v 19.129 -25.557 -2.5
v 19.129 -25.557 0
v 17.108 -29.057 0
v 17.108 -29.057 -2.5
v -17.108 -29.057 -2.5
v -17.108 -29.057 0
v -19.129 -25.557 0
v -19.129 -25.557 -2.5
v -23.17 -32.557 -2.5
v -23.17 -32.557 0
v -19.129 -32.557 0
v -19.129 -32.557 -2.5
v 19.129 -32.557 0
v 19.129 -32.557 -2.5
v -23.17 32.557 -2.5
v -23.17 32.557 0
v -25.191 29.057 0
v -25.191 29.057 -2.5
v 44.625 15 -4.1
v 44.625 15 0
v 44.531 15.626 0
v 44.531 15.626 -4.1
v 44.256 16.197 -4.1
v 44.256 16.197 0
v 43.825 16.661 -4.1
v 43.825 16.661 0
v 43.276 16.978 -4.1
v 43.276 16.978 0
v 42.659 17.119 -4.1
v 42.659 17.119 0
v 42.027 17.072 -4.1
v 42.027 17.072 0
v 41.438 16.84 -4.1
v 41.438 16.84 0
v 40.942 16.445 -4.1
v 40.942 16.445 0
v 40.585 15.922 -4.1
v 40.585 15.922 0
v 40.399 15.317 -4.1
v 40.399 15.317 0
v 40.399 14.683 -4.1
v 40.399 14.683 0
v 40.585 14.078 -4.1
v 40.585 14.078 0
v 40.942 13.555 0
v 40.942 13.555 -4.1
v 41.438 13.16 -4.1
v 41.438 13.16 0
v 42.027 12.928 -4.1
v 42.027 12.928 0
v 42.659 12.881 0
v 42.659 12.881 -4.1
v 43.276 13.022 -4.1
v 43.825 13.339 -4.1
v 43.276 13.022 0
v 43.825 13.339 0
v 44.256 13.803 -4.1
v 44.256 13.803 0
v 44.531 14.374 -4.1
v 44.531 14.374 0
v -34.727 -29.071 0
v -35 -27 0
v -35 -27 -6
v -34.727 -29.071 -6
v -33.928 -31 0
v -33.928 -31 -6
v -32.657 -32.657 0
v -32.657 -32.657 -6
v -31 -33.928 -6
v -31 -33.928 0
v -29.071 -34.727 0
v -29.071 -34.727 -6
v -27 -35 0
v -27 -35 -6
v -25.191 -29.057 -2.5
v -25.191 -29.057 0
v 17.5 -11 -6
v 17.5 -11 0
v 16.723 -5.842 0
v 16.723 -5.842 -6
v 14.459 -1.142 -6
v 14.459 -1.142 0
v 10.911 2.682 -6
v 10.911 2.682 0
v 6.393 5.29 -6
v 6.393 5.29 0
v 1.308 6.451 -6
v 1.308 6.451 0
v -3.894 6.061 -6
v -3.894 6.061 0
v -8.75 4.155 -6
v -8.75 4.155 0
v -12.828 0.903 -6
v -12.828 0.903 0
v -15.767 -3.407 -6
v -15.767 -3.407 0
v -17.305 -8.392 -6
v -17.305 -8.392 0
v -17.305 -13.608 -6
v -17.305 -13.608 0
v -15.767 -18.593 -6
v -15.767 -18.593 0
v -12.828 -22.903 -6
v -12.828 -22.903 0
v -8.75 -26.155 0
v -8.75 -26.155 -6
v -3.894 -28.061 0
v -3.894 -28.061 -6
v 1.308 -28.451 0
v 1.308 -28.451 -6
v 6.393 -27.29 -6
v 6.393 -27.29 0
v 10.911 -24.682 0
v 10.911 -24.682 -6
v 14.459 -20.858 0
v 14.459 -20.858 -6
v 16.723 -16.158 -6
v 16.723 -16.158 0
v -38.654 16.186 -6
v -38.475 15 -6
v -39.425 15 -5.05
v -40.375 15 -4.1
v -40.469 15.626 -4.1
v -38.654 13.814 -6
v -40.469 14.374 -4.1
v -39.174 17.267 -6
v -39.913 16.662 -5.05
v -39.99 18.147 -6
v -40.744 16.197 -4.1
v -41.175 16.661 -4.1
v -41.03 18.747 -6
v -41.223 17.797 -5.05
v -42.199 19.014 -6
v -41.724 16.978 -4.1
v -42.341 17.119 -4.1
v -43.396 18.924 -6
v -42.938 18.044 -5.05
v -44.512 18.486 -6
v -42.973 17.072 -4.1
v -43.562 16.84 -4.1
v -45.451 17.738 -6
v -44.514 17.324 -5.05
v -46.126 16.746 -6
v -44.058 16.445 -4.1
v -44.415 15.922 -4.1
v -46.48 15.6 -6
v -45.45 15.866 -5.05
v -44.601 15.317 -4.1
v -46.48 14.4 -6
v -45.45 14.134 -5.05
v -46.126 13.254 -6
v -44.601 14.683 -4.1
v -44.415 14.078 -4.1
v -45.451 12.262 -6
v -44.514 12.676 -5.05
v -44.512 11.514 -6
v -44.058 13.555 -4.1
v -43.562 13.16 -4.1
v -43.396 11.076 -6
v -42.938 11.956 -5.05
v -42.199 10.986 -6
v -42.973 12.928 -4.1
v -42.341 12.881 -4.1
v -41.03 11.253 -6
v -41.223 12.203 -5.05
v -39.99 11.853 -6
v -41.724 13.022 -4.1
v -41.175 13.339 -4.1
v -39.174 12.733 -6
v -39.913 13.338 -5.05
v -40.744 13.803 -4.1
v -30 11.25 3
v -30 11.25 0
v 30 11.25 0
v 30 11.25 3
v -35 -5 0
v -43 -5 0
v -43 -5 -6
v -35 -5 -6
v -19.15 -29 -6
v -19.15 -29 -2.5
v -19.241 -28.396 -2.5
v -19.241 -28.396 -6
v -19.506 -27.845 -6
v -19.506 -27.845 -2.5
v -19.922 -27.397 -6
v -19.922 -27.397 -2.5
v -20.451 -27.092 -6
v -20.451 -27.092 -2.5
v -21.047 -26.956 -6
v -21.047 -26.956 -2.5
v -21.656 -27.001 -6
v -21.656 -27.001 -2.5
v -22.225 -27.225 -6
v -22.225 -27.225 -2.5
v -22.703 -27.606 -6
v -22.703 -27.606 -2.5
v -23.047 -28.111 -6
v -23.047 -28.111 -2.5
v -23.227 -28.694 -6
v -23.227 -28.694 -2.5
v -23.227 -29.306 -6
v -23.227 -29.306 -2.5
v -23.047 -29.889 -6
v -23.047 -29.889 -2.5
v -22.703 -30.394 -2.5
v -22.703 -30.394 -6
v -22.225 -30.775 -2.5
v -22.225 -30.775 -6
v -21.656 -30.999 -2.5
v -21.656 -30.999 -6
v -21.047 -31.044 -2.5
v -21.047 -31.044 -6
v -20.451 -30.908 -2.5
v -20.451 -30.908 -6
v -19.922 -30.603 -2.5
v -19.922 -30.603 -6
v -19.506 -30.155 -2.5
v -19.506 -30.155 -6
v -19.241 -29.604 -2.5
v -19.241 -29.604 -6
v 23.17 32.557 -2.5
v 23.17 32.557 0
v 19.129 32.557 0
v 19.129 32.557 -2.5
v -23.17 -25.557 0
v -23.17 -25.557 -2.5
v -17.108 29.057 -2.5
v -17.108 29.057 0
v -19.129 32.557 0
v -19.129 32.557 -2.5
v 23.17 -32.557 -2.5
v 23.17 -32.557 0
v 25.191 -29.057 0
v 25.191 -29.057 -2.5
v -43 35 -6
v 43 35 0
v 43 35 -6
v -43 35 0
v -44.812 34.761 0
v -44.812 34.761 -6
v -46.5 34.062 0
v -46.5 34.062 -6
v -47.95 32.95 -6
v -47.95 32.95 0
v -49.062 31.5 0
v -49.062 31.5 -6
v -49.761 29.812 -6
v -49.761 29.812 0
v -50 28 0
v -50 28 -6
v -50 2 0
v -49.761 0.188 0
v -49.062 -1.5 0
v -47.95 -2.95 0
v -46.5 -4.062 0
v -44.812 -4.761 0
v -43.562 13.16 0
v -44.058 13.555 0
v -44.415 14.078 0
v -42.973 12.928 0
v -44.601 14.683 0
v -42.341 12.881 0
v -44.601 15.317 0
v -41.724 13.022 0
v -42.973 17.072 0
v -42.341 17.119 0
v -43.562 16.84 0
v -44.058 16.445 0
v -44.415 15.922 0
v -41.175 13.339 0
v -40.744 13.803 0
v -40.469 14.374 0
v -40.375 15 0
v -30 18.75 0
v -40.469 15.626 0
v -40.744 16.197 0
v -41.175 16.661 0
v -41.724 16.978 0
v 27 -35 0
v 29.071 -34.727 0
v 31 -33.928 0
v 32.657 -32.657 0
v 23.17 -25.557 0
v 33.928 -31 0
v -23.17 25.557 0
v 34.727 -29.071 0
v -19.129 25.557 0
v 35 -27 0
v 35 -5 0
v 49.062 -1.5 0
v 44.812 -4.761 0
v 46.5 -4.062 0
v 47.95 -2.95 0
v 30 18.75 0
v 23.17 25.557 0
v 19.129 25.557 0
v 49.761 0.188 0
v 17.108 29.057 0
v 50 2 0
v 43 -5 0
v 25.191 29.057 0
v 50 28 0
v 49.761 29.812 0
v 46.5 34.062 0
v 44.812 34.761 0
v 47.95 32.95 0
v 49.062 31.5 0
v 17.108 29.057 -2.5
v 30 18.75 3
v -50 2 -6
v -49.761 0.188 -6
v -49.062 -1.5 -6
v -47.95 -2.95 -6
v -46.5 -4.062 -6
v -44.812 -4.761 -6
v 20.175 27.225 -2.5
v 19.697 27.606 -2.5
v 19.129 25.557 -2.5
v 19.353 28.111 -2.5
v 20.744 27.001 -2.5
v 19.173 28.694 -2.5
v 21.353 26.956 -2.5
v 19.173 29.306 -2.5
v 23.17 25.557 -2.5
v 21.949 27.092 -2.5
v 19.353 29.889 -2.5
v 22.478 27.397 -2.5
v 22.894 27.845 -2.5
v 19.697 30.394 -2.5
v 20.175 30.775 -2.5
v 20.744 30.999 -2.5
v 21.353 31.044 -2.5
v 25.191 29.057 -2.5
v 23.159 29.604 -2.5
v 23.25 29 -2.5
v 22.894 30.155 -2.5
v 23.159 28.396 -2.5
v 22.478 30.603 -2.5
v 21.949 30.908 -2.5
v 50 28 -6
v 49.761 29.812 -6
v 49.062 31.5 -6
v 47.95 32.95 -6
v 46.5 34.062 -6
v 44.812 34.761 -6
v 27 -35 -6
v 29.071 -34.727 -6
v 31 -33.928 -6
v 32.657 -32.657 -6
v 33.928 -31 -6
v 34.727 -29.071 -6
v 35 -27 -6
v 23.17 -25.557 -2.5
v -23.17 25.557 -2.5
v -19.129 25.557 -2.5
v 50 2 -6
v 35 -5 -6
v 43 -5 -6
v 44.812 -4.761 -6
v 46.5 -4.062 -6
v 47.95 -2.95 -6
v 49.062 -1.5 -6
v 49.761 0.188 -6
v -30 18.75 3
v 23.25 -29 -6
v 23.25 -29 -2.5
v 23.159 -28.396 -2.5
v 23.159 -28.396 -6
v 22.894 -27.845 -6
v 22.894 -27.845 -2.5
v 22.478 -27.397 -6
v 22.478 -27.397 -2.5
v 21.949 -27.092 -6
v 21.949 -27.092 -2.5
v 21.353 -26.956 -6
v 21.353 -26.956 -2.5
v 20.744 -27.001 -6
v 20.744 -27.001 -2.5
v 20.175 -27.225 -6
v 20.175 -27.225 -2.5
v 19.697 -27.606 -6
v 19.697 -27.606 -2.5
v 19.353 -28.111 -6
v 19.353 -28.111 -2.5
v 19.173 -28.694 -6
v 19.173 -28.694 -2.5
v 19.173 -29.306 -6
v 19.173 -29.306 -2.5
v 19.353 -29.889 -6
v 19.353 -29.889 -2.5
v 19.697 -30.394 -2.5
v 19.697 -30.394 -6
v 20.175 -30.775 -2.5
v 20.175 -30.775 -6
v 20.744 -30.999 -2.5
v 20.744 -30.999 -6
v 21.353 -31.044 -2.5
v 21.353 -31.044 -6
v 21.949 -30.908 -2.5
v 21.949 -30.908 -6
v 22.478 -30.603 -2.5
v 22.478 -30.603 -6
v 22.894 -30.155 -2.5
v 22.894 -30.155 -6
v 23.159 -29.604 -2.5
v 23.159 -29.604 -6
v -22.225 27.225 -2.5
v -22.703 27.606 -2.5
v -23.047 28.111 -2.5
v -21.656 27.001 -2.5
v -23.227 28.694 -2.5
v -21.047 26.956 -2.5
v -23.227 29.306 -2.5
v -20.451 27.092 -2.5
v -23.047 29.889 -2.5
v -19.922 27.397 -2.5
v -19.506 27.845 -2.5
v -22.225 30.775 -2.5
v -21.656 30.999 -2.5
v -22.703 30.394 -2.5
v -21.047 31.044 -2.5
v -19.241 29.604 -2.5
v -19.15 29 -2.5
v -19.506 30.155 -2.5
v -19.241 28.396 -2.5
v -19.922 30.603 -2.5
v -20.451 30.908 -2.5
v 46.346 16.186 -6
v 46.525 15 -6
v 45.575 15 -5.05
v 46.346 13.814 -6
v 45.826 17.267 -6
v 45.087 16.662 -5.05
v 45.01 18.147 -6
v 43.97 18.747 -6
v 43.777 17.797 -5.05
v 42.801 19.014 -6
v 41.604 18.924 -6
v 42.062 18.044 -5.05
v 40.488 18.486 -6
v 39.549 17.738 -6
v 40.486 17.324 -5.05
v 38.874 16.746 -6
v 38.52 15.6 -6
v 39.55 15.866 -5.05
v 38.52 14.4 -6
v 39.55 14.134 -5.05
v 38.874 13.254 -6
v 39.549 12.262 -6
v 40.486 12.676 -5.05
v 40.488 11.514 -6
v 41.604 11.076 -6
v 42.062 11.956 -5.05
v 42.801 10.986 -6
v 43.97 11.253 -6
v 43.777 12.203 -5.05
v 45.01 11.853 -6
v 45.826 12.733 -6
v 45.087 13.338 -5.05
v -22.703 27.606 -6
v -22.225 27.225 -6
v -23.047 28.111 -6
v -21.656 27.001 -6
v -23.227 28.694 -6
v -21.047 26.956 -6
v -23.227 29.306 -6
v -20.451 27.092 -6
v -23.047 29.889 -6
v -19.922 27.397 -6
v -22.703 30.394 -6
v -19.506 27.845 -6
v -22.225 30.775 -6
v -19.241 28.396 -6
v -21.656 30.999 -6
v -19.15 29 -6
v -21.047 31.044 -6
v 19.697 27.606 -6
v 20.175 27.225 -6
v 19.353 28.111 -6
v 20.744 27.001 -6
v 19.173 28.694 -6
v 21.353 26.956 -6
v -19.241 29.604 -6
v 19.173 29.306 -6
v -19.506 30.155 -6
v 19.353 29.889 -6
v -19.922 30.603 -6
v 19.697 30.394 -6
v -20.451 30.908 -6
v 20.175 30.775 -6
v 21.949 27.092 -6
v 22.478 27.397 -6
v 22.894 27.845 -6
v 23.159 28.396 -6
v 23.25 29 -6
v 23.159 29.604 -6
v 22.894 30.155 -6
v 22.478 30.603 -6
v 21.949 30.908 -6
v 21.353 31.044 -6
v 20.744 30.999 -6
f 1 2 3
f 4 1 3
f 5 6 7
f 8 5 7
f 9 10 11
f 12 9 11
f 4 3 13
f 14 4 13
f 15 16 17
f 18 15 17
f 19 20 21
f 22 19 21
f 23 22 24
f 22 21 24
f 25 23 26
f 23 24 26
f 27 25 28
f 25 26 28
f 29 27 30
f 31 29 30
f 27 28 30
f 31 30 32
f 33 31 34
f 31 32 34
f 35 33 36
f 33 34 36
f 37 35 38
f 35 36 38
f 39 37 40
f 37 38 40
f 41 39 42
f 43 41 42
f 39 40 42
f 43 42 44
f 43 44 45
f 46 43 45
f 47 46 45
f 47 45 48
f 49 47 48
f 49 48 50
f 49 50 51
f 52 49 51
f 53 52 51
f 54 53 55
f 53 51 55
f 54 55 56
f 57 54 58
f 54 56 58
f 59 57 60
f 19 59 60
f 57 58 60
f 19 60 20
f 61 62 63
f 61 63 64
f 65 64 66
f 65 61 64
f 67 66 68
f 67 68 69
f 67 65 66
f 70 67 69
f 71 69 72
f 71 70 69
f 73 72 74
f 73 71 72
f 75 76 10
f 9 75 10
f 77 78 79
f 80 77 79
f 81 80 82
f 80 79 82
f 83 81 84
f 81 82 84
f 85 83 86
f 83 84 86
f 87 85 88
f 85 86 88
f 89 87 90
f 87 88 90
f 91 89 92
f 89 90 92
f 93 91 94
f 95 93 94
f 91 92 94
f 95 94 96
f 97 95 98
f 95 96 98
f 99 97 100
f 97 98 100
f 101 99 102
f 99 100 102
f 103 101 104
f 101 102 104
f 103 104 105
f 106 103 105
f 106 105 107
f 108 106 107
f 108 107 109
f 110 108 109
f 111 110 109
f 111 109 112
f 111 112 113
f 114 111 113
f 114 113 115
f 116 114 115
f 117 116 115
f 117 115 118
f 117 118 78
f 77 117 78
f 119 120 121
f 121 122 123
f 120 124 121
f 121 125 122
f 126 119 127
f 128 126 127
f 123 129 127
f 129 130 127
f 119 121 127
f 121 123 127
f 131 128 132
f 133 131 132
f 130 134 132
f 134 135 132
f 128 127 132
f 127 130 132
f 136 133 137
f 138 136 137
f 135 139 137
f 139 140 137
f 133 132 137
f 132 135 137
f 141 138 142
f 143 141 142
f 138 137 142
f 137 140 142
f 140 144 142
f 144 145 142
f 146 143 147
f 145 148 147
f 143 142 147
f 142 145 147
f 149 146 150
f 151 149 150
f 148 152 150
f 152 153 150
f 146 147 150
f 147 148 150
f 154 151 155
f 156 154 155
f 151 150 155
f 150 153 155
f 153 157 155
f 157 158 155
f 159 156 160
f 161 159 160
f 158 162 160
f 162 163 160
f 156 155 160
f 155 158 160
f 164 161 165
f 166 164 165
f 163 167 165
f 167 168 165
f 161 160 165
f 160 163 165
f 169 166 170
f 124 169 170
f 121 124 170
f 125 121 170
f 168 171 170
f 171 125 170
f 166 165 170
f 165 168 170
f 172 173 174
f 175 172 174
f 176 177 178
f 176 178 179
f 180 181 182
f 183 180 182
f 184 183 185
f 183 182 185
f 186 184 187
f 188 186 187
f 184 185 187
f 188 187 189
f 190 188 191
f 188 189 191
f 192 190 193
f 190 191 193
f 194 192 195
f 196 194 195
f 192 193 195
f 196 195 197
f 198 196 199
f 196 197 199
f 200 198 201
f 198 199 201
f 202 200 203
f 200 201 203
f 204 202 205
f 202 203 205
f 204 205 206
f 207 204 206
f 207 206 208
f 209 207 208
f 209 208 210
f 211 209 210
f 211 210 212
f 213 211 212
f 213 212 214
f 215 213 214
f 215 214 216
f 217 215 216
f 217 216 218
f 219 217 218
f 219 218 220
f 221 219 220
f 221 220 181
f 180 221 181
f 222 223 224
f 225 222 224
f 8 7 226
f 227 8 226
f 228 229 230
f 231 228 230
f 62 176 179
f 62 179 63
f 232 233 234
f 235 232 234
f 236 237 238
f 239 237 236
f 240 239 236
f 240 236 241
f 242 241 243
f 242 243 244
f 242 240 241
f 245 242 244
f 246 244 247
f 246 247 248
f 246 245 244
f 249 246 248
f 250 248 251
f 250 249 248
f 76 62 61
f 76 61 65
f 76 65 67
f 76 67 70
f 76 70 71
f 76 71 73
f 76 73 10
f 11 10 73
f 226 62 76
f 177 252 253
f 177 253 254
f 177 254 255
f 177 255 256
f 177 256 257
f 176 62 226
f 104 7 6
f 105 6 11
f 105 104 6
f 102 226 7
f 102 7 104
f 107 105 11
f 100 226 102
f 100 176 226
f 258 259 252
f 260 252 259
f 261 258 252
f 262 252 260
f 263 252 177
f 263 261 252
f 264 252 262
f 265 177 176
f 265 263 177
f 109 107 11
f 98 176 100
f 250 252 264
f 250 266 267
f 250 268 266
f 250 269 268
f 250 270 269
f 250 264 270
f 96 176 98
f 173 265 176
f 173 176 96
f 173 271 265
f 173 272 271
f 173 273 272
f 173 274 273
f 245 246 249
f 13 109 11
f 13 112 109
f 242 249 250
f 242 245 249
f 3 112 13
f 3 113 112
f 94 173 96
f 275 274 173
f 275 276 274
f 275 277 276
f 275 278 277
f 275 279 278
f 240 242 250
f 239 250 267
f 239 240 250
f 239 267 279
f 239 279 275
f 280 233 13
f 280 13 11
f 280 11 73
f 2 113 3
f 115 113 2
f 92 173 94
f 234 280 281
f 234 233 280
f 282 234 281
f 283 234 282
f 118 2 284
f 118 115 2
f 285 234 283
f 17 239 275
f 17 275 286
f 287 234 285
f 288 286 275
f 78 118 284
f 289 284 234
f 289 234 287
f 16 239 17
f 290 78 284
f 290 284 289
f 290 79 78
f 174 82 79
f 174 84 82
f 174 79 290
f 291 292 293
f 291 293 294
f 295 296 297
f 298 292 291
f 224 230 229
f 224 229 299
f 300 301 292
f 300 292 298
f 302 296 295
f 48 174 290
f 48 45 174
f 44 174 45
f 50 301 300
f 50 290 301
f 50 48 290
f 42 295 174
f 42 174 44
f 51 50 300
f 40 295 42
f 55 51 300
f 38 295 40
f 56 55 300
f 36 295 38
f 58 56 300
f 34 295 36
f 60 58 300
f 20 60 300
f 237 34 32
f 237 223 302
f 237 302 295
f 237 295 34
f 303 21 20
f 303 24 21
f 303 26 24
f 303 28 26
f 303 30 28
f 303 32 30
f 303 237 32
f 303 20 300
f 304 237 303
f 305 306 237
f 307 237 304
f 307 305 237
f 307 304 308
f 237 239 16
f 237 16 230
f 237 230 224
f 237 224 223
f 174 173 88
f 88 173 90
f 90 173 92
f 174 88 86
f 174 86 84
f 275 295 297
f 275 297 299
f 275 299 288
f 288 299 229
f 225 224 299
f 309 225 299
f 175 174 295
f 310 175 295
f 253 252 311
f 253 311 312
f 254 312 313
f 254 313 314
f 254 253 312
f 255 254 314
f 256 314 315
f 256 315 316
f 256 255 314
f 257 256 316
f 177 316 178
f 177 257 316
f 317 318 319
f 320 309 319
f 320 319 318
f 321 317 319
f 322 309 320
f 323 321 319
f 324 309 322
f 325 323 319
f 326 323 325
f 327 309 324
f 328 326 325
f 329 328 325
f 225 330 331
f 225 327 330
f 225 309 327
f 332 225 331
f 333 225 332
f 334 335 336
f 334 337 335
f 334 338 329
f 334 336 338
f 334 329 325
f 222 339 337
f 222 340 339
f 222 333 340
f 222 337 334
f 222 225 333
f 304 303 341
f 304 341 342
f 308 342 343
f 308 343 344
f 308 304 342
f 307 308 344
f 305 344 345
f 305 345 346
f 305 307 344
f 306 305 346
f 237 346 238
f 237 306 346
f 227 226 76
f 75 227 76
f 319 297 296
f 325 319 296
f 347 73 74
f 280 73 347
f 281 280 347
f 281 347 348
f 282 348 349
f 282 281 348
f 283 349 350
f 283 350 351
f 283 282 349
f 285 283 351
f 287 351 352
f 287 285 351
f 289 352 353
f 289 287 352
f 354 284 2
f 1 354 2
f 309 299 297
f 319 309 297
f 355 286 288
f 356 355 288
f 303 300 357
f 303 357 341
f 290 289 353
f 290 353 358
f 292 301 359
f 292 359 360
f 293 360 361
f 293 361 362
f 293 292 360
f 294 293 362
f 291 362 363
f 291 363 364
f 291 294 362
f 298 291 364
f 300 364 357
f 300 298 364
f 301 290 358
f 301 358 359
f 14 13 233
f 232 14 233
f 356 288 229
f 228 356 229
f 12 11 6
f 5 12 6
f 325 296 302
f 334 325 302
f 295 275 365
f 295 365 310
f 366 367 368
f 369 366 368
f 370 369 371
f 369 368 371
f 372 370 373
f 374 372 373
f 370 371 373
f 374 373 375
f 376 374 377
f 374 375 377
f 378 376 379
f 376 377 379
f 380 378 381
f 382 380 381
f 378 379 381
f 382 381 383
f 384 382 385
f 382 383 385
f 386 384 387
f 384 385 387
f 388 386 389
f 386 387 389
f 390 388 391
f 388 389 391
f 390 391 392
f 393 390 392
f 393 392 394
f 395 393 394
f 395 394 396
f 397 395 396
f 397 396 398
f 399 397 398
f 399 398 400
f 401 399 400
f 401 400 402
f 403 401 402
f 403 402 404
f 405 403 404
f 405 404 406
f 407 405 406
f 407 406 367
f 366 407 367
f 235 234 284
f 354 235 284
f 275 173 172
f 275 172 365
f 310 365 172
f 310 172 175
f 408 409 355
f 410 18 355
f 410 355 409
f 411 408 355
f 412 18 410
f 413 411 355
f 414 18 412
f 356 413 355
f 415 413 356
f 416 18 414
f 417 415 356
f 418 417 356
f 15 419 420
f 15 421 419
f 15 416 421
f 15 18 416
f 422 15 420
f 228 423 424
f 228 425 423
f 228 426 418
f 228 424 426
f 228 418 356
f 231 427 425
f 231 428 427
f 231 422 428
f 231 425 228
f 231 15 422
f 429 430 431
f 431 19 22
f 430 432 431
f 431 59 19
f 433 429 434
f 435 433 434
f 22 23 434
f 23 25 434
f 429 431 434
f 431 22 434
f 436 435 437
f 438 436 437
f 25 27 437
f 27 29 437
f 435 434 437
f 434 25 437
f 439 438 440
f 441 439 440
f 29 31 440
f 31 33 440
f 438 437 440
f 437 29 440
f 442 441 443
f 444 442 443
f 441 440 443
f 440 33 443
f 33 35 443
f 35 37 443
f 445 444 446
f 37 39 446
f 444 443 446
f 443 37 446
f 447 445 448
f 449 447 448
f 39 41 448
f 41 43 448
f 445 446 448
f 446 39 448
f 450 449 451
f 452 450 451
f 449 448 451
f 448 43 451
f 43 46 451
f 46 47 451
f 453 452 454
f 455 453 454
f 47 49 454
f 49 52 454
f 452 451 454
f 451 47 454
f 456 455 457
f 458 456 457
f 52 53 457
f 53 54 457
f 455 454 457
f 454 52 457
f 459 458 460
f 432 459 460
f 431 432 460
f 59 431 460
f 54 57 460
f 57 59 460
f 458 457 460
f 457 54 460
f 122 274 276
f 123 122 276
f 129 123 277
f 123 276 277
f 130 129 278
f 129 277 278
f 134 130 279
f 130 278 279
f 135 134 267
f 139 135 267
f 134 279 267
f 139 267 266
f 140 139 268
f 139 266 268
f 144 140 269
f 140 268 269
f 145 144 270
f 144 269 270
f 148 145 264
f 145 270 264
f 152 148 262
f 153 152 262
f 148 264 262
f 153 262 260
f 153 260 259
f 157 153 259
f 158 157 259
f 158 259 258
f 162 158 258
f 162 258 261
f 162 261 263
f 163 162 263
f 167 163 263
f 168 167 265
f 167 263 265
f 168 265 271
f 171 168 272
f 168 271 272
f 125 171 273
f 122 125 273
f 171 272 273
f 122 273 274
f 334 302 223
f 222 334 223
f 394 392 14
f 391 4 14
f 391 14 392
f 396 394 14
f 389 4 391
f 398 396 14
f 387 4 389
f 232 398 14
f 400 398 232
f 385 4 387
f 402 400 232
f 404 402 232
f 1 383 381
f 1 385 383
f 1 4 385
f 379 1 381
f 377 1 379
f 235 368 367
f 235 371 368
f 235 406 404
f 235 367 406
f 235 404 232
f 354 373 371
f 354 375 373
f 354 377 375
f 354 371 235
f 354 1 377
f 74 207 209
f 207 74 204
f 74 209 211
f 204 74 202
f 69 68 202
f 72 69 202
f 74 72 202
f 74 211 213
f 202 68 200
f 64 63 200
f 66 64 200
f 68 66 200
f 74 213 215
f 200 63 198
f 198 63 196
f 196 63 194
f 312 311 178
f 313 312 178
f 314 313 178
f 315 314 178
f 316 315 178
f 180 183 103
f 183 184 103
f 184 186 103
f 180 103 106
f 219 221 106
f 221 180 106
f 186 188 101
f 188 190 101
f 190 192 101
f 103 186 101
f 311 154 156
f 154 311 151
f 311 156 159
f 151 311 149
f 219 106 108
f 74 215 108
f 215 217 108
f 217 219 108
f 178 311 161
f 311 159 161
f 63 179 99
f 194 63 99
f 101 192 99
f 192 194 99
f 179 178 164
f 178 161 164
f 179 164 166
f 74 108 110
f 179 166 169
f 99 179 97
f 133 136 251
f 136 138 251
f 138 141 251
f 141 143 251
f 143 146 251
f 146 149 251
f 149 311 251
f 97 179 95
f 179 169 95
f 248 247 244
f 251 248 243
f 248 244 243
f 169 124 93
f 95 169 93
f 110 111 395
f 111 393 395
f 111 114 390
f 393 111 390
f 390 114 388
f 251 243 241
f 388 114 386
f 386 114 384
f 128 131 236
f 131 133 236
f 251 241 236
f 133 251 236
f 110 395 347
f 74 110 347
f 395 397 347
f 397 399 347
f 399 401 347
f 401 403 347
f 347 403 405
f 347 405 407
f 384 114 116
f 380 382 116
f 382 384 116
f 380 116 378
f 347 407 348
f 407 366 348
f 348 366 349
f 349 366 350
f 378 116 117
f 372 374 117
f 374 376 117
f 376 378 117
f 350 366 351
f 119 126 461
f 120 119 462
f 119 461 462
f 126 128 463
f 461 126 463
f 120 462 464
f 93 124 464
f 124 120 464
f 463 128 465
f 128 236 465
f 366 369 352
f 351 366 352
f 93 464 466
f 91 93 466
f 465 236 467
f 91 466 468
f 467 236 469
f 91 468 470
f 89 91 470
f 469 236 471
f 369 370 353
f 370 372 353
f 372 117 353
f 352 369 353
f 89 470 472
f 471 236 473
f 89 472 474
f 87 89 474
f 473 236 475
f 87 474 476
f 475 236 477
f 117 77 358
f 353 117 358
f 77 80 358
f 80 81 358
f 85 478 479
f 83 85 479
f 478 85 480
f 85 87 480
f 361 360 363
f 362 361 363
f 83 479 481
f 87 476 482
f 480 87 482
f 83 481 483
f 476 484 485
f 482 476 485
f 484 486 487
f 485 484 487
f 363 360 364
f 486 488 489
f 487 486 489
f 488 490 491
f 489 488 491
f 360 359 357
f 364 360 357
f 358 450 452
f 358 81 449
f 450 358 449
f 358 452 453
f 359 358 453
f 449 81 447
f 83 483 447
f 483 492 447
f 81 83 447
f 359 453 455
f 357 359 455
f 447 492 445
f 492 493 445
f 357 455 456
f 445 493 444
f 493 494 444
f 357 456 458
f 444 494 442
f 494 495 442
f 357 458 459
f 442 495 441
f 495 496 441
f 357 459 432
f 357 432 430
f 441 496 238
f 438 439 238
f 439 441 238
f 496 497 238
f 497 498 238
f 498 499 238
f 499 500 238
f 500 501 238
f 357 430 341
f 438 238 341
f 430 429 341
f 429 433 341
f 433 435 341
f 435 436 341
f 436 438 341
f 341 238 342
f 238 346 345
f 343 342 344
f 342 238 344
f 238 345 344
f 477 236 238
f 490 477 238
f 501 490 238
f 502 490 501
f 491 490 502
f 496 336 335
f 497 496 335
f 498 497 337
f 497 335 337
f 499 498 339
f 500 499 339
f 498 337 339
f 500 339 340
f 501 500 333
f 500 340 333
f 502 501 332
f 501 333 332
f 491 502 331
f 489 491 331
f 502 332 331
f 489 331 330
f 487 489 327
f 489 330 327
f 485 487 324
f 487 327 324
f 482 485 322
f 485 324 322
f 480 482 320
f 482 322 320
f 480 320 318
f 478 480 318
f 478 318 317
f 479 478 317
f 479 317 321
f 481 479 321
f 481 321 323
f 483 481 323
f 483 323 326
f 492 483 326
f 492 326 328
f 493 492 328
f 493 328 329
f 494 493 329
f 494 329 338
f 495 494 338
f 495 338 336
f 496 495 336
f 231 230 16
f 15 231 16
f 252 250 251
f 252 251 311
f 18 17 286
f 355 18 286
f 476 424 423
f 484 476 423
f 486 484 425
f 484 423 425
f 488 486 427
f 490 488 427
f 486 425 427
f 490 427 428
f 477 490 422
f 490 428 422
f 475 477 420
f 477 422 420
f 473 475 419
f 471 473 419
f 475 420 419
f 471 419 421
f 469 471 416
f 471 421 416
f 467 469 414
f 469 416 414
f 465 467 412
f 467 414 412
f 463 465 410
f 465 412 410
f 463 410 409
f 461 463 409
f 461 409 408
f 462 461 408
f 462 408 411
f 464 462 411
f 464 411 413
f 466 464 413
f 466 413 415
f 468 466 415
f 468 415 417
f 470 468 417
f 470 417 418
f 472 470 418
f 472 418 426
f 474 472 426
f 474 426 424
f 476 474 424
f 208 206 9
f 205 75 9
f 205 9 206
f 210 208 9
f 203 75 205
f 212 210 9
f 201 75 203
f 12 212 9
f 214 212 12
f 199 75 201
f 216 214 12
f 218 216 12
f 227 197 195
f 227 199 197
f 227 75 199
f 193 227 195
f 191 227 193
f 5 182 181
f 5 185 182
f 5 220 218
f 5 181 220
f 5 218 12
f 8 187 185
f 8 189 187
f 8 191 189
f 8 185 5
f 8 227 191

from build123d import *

# Parameters (mm, degrees)
F0_R      = 2.05
F1_DEPTH  = 6
F2_R      = 2.125
F2_W      = 60
F2_H      = 7.5
F3_DEPTH  = 6
F5_DEPTH  = 2.5
F6_DEPTH  = 25
F7_SIZE   = 1.9
F8_DEPTH  = 3
F9_R      = 17.5
F10_DEPTH = 25


# Not quite as in the source:
# - a feature names something its author has since deleted; it is built from what else it names


with BuildPart() as f1:
    # F0 (on Top) → F1 (new body)
    with BuildSketch(Plane.XY):
        with BuildLine():
            ThreePointArc((35, 27), (32.6568542495, 32.6568542495), (27, 35))
            Line((27, 35), (-27, 35))
            ThreePointArc((-27, 35), (-32.6568542495, 32.6568542495), (-35, 27))
            Line((-35, 27), (-35, -27))
            ThreePointArc((-35, -27), (-32.6568542495, -32.6568542495), (-27, -35))
            Line((-27, -35), (27, -35))
            ThreePointArc((27, -35), (32.6568542495, -32.6568542495), (35, -27))
            Line((35, -27), (35, 27))
        make_face()
        with Locations((-21.2, -29)):
            Circle(F0_R, mode=Mode.SUBTRACT)
        with Locations((21.2, -29)):
            Circle(F0_R, mode=Mode.SUBTRACT)
        with Locations((-21.2, 29)):
            Circle(F0_R, mode=Mode.SUBTRACT)
        with Locations((21.2, 29)):
            Circle(F0_R, mode=Mode.SUBTRACT)
        with Locations((-21.2, 29)):
            Circle(F0_R)
        with Locations((21.2, 29)):
            Circle(F0_R)
        with Locations((21.2, -29)):
            Circle(F0_R)
        with Locations((-21.2, -29)):
            Circle(F0_R)
    extrude(amount=-F1_DEPTH)

    # F2 (on Top) → F3 (join)
    with BuildSketch(Plane.XY):
        with BuildLine():
            ThreePointArc((50, 28), (47.9497474683, 32.9497474683), (43, 35))
            Line((43, 35), (-43, 35))
            ThreePointArc((-43, 35), (-47.9497474683, 32.9497474683), (-50, 28))
            Line((-50, 28), (-50, 2))
            ThreePointArc((-50, 2), (-47.9497474683, -2.9497474683), (-43, -5))
            Line((-43, -5), (43, -5))
            ThreePointArc((43, -5), (47.9497474683, -2.9497474683), (50, 2))
            Line((50, 2), (50, 28))
        make_face()
        with Locations((-42.5, 15)):
            Circle(F2_R, mode=Mode.SUBTRACT)
        with Locations((0, 15)):
            Rectangle(F2_W, F2_H, mode=Mode.SUBTRACT)
        with Locations((42.5, 15)):
            Circle(F2_R, mode=Mode.SUBTRACT)
    extrude(amount=-F3_DEPTH)

    # F4 (on Top) → F5 (cut)
    with BuildSketch(Plane.XY):
        Polygon((19.1289578016, -32.5574766695), (23.1704096859, -32.5574766695), (25.191135628, -29.0574766695), (23.1704096859, -25.5574766695), (19.1289578016, -25.5574766695), (17.1082318594, -29.0574766695), align=None)
        Polygon((-17.1082318594, -29.0574766695), (-19.1289578016, -25.5574766695), (-23.1704096859, -25.5574766695), (-25.191135628, -29.0574766695), (-23.1704096859, -32.5574766695), (-19.1289578016, -32.5574766695), align=None)
        Polygon((-23.1704096859, 25.5574766695), (-19.1289578016, 25.5574766695), (-17.1082318594, 29.0574766695), (-19.1289578016, 32.5574766695), (-23.1704096859, 32.5574766695), (-25.191135628, 29.0574766695), align=None)
        Polygon((19.1289578016, 32.5574766695), (17.1082318594, 29.0574766695), (19.1289578016, 25.5574766695), (23.1704096859, 25.5574766695), (25.191135628, 29.0574766695), (23.1704096859, 32.5574766695), align=None)
    extrude(amount=-F5_DEPTH, mode=Mode.SUBTRACT)

    # F0 (on Top) → F6 (cut)
    with BuildSketch(Plane.XY):
        with Locations((-21.2, 29)):
            Circle(F0_R)
        with Locations((21.2, 29)):
            Circle(F0_R)
        with Locations((21.2, -29)):
            Circle(F0_R)
        with Locations((-21.2, -29)):
            Circle(F0_R)
    extrude(amount=-F6_DEPTH, mode=Mode.SUBTRACT)

    # F7
    f7_edges = [f1.edges().sort_by_distance(p)[0] for p in [
        (40.375, 15, -6),
        (-44.625, 15, -6),
    ]]
    chamfer(f7_edges, length=F7_SIZE)

    # F2 (on Top) → F8 (join)
    with BuildSketch(Plane.XY):
        with Locations((0, 15)):
            Rectangle(F2_W, F2_H)
    extrude(amount=F8_DEPTH)

    # F9 (on Top) → F10 (cut)
    with BuildSketch(Plane.XY):
        with Locations((0, -11)):
            Circle(F9_R)
    extrude(amount=-F10_DEPTH, mode=Mode.SUBTRACT)


solid = f1.part
